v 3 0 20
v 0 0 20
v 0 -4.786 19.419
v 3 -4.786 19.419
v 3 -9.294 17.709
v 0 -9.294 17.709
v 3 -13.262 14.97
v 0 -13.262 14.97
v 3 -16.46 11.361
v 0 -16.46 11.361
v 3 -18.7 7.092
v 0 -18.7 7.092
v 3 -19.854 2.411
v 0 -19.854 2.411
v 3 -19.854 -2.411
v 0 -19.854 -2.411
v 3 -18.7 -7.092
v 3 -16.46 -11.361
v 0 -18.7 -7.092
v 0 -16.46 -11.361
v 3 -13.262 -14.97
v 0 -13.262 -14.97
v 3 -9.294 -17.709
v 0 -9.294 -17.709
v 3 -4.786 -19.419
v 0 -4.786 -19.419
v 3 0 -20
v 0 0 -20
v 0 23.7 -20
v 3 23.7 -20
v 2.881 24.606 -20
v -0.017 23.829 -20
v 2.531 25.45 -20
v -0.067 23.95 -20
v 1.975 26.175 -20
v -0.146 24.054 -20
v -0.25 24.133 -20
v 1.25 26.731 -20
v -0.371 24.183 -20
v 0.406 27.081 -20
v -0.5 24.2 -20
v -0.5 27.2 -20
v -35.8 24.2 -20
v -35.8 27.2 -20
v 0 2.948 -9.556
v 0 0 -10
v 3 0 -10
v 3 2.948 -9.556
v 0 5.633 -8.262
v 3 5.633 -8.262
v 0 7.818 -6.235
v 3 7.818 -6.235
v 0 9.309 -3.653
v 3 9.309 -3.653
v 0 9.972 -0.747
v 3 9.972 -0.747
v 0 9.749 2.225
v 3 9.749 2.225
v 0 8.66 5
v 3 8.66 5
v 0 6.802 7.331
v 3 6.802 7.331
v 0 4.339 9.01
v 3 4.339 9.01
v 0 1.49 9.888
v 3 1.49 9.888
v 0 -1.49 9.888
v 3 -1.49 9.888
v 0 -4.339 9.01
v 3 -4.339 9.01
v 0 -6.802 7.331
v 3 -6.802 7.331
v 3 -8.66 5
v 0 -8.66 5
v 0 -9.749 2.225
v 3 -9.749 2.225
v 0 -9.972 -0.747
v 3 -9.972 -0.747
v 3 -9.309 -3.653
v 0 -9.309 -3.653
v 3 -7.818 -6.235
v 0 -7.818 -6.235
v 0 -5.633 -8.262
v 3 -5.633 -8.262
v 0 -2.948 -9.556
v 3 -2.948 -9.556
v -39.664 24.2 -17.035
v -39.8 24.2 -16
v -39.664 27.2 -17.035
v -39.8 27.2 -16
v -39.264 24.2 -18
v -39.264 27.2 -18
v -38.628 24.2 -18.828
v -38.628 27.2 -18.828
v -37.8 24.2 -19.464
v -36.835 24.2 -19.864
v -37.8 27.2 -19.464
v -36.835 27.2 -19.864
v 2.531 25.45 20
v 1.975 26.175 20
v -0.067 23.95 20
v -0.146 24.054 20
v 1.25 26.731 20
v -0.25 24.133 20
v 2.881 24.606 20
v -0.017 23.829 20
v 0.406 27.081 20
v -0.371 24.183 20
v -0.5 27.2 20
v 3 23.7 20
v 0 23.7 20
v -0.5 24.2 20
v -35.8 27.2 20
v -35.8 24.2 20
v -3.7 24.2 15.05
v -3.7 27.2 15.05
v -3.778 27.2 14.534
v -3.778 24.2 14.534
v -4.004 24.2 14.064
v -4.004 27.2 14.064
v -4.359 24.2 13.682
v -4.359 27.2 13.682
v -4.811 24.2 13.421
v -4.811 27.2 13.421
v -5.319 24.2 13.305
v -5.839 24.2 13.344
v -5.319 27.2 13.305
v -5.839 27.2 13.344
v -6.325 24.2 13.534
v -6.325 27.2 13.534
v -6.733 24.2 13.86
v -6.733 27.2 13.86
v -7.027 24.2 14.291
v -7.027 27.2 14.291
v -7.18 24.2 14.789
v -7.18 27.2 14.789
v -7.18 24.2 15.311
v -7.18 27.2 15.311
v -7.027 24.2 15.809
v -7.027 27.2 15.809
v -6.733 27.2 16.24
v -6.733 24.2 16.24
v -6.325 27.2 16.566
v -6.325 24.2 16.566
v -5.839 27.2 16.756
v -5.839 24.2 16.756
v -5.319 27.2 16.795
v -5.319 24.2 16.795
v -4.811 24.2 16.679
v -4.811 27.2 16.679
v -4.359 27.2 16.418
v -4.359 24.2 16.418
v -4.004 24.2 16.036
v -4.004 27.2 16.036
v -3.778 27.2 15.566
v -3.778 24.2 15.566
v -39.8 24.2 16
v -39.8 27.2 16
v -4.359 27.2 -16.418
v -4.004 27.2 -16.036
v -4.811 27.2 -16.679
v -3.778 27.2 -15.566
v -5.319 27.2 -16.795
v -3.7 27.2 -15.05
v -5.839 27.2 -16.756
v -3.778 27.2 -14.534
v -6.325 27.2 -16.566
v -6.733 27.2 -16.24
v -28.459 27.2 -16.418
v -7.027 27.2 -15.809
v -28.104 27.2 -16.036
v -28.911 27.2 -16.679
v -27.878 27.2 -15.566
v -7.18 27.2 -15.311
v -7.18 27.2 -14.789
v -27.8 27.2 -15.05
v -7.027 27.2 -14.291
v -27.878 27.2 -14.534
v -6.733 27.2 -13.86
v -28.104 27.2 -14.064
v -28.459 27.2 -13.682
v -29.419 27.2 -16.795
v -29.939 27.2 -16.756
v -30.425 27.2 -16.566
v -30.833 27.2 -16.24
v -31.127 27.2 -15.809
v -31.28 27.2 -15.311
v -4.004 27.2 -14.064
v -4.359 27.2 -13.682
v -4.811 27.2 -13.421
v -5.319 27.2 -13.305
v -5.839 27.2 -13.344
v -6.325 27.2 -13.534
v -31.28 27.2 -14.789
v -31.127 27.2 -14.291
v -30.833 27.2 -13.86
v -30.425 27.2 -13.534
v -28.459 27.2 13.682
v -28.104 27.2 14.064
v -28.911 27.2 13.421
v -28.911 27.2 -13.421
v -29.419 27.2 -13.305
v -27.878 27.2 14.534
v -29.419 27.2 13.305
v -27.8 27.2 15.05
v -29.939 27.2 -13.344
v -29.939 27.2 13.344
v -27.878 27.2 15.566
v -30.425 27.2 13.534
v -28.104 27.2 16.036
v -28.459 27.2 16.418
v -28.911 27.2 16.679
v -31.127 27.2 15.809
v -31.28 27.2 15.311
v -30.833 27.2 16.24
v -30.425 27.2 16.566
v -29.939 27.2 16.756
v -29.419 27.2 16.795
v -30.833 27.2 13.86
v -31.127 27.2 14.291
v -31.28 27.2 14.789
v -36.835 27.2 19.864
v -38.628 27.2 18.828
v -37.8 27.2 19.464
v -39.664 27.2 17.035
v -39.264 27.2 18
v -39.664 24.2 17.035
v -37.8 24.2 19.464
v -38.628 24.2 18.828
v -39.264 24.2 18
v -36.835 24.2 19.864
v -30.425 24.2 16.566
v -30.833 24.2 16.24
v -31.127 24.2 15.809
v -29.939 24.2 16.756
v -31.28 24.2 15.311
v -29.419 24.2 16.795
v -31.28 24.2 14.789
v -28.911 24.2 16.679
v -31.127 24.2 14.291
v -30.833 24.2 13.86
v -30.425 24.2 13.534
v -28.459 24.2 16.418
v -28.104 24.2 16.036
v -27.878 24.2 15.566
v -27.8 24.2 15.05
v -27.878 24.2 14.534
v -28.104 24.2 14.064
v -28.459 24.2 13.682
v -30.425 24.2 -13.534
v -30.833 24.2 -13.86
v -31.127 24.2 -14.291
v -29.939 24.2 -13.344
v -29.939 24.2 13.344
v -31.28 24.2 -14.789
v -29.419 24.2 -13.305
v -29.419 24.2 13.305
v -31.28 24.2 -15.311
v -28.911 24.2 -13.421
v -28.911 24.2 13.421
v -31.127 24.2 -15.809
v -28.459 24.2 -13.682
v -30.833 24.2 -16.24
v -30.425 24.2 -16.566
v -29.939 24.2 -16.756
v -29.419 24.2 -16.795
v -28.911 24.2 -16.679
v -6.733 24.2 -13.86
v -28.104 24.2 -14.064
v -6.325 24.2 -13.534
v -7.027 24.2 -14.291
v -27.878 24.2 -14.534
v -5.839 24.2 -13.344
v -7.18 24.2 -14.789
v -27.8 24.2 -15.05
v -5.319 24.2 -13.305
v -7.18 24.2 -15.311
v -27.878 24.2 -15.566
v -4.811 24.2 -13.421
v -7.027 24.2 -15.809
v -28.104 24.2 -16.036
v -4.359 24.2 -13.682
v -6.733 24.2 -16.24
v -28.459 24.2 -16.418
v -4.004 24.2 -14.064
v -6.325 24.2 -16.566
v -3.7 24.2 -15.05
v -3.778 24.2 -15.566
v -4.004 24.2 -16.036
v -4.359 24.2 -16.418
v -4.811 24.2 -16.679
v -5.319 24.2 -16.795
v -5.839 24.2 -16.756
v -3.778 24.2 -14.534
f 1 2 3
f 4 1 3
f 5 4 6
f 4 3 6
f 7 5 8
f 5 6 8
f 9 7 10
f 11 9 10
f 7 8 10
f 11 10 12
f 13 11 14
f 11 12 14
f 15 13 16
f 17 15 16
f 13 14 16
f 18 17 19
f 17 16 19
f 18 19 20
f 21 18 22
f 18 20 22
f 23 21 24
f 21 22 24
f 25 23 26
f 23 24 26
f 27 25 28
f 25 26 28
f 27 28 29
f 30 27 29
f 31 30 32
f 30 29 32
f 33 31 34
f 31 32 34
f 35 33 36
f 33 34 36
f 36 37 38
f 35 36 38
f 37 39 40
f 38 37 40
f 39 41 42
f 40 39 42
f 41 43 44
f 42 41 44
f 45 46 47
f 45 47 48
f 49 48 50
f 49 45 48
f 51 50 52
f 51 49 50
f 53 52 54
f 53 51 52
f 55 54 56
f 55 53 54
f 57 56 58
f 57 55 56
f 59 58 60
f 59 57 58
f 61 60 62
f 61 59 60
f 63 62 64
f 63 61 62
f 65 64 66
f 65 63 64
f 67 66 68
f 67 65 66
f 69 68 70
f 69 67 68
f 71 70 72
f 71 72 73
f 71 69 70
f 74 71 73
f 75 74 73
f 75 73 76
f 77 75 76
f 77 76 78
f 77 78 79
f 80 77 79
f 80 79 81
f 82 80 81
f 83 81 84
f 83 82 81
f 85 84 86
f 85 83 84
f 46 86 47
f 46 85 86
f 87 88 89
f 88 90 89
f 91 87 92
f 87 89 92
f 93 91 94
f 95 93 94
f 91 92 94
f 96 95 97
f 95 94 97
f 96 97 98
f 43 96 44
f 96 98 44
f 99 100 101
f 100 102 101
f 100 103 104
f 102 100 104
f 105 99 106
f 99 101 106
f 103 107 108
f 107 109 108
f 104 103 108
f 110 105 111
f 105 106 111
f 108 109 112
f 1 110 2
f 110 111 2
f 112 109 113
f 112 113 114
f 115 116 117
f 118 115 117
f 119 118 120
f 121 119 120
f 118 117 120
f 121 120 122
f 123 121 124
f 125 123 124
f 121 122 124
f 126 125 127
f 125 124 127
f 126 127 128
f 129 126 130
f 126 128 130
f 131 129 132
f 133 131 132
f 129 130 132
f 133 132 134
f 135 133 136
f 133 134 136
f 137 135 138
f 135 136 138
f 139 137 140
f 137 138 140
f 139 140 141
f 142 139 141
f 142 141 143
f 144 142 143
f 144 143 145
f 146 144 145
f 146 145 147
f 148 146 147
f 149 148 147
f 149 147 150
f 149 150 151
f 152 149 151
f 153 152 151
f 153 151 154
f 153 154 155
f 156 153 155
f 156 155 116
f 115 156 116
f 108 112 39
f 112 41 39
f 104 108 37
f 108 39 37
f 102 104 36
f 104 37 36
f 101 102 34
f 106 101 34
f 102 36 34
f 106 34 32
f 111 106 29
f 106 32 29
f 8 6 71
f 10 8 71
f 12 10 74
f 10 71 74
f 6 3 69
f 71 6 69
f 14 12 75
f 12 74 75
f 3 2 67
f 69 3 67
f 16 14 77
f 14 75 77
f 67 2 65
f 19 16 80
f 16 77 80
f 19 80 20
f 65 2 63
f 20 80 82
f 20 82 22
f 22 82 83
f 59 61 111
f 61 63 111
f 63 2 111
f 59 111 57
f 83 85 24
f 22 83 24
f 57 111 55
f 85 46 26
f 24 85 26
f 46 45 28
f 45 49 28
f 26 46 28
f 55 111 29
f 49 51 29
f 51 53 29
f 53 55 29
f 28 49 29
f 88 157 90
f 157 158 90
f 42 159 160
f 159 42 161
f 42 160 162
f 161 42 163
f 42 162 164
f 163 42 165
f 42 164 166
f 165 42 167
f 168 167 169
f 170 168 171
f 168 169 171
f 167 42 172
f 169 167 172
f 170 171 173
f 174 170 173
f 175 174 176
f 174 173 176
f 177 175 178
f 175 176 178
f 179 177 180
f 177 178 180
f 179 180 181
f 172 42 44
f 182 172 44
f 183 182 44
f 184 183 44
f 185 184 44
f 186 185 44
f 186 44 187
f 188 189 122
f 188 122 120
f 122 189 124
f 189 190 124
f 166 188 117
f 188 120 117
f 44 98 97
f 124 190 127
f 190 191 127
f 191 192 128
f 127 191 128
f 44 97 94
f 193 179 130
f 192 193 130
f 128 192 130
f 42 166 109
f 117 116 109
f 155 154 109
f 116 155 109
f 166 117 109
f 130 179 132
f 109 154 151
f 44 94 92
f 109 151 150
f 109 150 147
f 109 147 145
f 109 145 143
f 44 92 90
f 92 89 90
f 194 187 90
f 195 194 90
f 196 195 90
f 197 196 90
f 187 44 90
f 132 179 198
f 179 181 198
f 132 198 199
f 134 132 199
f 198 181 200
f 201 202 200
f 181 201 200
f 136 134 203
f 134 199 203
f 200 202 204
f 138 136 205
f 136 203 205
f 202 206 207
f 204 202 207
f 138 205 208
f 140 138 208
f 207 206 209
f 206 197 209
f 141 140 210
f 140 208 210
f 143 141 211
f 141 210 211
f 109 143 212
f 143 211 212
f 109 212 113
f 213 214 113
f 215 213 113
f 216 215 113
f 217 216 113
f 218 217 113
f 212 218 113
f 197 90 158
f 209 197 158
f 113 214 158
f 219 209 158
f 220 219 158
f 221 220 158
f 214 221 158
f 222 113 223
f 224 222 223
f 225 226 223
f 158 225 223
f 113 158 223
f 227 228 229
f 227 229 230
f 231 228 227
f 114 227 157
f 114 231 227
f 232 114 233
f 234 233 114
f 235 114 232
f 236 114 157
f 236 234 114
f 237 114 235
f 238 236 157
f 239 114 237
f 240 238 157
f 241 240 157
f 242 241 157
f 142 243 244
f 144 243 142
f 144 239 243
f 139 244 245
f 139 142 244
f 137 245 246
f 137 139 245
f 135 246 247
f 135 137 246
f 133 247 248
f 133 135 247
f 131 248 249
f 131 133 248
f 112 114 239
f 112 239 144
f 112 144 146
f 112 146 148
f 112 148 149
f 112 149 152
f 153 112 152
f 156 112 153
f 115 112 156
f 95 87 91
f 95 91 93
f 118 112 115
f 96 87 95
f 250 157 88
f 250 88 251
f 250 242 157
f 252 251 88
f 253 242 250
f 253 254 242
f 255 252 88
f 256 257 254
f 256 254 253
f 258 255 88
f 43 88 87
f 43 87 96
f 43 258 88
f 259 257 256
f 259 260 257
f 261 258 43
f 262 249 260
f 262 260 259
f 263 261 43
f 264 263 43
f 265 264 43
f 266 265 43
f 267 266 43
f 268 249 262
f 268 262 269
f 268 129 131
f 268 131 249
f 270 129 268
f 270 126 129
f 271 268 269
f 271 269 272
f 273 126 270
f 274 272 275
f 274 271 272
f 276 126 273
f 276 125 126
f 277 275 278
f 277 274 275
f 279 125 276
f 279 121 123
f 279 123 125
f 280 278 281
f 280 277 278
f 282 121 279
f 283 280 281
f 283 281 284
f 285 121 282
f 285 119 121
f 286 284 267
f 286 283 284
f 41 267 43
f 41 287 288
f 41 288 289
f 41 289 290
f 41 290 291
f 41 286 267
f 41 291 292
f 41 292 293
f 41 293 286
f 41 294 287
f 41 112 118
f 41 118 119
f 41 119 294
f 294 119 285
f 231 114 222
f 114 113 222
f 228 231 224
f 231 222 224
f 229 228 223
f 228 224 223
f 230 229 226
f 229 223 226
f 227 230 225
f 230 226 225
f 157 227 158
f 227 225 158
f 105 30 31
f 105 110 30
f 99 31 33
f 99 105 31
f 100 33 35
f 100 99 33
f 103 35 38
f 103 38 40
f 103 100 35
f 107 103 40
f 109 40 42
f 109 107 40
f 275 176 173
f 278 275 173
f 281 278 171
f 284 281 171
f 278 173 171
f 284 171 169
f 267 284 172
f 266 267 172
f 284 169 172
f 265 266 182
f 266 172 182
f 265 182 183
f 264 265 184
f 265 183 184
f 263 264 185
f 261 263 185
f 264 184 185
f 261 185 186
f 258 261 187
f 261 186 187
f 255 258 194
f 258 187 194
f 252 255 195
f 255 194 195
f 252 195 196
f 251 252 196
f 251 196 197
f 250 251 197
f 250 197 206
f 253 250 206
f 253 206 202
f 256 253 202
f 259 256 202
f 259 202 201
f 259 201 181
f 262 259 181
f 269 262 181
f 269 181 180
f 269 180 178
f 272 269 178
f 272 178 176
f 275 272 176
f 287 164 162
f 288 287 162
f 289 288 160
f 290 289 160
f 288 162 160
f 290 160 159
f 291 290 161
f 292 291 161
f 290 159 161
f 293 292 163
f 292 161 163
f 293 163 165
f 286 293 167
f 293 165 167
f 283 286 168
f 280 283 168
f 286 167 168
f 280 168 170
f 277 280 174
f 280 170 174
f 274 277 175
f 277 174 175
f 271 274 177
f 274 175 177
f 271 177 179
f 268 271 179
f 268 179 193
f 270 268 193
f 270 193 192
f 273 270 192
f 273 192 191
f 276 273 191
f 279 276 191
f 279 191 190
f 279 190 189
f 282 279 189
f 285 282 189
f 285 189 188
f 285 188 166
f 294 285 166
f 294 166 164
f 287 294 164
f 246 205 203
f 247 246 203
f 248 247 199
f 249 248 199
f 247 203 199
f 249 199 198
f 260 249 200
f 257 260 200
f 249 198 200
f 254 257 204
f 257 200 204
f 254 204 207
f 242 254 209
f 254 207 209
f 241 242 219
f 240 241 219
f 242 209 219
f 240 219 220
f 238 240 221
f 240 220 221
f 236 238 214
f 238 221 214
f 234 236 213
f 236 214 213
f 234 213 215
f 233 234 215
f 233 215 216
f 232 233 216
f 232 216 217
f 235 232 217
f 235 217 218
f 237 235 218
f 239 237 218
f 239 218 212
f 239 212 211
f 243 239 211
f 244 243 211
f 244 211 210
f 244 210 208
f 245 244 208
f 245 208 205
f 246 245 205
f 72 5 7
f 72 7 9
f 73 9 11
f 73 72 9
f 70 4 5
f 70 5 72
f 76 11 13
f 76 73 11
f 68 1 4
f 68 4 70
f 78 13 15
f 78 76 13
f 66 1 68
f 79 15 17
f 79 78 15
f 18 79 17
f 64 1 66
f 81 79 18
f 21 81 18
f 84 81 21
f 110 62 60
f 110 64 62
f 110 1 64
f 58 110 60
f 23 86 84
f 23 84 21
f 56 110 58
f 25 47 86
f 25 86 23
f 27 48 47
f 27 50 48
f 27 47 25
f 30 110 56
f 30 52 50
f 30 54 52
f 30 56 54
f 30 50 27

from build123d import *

# Parameters (mm, degrees)
SKETCH1_R           = 20
SKETCH1_R_2         = 10
BOSS_EXTRUDE1_DEPTH = 3
SKETCH2_W           = 40
SKETCH2_H           = 3
BOSS_EXTRUDE2_DEPTH = 42.8
FILLET1_R           = 0.5
FILLET2_R           = 3.5
FILLET3_R           = 4
SKETCH3_R           = 1.75
CUT_EXTRUDE1_DEPTH  = 10


with BuildPart() as part:
    # Sketch1 → Boss-Extrude1 (new body)
    with BuildSketch(Plane(origin=(0, 0, 0), x_dir=(0, 0, -1), z_dir=(1, 0, 0))):
        with BuildLine():
            Line((-20, 27.2), (-20, 0))
            ThreePointArc((-20, 0), (0, 20), (20, 0))
            Line((20, 0), (20, 27.2))
            Line((20, 27.2), (-20, 27.2))
        make_face()
        Circle(SKETCH1_R)
        Circle(SKETCH1_R_2, mode=Mode.SUBTRACT)
    extrude(amount=BOSS_EXTRUDE1_DEPTH)

    # Sketch2 → Boss-Extrude2 (add)
    with BuildSketch(Plane(origin=(3, 0, 0), x_dir=(0, 0, -1), z_dir=(1, 0, 0))):
        with Locations((0, 25.7)):
            Rectangle(SKETCH2_W, SKETCH2_H)
    extrude(amount=-BOSS_EXTRUDE2_DEPTH)

    # Fillet1
    fillet1_edges = [part.edges().sort_by_distance(p)[0] for p in [
        (0, 24.2, 0),
    ]]
    fillet(fillet1_edges, radius=FILLET1_R)

    # Fillet2
    fillet2_edges = [part.edges().sort_by_distance(p)[0] for p in [
        (3, 27.2, 0),
    ]]
    fillet(fillet2_edges, radius=FILLET2_R)

    # Fillet3
    fillet3_edges = [part.edges().sort_by_distance(p)[0] for p in [
        (-39.8, 25.7, 20),
        (-39.8, 25.7, -20),
    ]]
    fillet(fillet3_edges, radius=FILLET3_R)

    # Sketch3 → Cut-Extrude1 (cut)
    with BuildSketch(Plane(origin=(0, 27.2, 0), x_dir=(1, 0, 0), z_dir=(0, 1, 0))):
        with Locations((-29.55, 15.05)):
            Circle(SKETCH3_R)
        with Locations((-5.45, 15.05)):
            Circle(SKETCH3_R)
        with Locations((-29.55, -15.05)):
            Circle(SKETCH3_R)
        with Locations((-5.45, -15.05)):
            Circle(SKETCH3_R)
    extrude(amount=-CUT_EXTRUDE1_DEPTH, mode=Mode.SUBTRACT)


solid = part.part
